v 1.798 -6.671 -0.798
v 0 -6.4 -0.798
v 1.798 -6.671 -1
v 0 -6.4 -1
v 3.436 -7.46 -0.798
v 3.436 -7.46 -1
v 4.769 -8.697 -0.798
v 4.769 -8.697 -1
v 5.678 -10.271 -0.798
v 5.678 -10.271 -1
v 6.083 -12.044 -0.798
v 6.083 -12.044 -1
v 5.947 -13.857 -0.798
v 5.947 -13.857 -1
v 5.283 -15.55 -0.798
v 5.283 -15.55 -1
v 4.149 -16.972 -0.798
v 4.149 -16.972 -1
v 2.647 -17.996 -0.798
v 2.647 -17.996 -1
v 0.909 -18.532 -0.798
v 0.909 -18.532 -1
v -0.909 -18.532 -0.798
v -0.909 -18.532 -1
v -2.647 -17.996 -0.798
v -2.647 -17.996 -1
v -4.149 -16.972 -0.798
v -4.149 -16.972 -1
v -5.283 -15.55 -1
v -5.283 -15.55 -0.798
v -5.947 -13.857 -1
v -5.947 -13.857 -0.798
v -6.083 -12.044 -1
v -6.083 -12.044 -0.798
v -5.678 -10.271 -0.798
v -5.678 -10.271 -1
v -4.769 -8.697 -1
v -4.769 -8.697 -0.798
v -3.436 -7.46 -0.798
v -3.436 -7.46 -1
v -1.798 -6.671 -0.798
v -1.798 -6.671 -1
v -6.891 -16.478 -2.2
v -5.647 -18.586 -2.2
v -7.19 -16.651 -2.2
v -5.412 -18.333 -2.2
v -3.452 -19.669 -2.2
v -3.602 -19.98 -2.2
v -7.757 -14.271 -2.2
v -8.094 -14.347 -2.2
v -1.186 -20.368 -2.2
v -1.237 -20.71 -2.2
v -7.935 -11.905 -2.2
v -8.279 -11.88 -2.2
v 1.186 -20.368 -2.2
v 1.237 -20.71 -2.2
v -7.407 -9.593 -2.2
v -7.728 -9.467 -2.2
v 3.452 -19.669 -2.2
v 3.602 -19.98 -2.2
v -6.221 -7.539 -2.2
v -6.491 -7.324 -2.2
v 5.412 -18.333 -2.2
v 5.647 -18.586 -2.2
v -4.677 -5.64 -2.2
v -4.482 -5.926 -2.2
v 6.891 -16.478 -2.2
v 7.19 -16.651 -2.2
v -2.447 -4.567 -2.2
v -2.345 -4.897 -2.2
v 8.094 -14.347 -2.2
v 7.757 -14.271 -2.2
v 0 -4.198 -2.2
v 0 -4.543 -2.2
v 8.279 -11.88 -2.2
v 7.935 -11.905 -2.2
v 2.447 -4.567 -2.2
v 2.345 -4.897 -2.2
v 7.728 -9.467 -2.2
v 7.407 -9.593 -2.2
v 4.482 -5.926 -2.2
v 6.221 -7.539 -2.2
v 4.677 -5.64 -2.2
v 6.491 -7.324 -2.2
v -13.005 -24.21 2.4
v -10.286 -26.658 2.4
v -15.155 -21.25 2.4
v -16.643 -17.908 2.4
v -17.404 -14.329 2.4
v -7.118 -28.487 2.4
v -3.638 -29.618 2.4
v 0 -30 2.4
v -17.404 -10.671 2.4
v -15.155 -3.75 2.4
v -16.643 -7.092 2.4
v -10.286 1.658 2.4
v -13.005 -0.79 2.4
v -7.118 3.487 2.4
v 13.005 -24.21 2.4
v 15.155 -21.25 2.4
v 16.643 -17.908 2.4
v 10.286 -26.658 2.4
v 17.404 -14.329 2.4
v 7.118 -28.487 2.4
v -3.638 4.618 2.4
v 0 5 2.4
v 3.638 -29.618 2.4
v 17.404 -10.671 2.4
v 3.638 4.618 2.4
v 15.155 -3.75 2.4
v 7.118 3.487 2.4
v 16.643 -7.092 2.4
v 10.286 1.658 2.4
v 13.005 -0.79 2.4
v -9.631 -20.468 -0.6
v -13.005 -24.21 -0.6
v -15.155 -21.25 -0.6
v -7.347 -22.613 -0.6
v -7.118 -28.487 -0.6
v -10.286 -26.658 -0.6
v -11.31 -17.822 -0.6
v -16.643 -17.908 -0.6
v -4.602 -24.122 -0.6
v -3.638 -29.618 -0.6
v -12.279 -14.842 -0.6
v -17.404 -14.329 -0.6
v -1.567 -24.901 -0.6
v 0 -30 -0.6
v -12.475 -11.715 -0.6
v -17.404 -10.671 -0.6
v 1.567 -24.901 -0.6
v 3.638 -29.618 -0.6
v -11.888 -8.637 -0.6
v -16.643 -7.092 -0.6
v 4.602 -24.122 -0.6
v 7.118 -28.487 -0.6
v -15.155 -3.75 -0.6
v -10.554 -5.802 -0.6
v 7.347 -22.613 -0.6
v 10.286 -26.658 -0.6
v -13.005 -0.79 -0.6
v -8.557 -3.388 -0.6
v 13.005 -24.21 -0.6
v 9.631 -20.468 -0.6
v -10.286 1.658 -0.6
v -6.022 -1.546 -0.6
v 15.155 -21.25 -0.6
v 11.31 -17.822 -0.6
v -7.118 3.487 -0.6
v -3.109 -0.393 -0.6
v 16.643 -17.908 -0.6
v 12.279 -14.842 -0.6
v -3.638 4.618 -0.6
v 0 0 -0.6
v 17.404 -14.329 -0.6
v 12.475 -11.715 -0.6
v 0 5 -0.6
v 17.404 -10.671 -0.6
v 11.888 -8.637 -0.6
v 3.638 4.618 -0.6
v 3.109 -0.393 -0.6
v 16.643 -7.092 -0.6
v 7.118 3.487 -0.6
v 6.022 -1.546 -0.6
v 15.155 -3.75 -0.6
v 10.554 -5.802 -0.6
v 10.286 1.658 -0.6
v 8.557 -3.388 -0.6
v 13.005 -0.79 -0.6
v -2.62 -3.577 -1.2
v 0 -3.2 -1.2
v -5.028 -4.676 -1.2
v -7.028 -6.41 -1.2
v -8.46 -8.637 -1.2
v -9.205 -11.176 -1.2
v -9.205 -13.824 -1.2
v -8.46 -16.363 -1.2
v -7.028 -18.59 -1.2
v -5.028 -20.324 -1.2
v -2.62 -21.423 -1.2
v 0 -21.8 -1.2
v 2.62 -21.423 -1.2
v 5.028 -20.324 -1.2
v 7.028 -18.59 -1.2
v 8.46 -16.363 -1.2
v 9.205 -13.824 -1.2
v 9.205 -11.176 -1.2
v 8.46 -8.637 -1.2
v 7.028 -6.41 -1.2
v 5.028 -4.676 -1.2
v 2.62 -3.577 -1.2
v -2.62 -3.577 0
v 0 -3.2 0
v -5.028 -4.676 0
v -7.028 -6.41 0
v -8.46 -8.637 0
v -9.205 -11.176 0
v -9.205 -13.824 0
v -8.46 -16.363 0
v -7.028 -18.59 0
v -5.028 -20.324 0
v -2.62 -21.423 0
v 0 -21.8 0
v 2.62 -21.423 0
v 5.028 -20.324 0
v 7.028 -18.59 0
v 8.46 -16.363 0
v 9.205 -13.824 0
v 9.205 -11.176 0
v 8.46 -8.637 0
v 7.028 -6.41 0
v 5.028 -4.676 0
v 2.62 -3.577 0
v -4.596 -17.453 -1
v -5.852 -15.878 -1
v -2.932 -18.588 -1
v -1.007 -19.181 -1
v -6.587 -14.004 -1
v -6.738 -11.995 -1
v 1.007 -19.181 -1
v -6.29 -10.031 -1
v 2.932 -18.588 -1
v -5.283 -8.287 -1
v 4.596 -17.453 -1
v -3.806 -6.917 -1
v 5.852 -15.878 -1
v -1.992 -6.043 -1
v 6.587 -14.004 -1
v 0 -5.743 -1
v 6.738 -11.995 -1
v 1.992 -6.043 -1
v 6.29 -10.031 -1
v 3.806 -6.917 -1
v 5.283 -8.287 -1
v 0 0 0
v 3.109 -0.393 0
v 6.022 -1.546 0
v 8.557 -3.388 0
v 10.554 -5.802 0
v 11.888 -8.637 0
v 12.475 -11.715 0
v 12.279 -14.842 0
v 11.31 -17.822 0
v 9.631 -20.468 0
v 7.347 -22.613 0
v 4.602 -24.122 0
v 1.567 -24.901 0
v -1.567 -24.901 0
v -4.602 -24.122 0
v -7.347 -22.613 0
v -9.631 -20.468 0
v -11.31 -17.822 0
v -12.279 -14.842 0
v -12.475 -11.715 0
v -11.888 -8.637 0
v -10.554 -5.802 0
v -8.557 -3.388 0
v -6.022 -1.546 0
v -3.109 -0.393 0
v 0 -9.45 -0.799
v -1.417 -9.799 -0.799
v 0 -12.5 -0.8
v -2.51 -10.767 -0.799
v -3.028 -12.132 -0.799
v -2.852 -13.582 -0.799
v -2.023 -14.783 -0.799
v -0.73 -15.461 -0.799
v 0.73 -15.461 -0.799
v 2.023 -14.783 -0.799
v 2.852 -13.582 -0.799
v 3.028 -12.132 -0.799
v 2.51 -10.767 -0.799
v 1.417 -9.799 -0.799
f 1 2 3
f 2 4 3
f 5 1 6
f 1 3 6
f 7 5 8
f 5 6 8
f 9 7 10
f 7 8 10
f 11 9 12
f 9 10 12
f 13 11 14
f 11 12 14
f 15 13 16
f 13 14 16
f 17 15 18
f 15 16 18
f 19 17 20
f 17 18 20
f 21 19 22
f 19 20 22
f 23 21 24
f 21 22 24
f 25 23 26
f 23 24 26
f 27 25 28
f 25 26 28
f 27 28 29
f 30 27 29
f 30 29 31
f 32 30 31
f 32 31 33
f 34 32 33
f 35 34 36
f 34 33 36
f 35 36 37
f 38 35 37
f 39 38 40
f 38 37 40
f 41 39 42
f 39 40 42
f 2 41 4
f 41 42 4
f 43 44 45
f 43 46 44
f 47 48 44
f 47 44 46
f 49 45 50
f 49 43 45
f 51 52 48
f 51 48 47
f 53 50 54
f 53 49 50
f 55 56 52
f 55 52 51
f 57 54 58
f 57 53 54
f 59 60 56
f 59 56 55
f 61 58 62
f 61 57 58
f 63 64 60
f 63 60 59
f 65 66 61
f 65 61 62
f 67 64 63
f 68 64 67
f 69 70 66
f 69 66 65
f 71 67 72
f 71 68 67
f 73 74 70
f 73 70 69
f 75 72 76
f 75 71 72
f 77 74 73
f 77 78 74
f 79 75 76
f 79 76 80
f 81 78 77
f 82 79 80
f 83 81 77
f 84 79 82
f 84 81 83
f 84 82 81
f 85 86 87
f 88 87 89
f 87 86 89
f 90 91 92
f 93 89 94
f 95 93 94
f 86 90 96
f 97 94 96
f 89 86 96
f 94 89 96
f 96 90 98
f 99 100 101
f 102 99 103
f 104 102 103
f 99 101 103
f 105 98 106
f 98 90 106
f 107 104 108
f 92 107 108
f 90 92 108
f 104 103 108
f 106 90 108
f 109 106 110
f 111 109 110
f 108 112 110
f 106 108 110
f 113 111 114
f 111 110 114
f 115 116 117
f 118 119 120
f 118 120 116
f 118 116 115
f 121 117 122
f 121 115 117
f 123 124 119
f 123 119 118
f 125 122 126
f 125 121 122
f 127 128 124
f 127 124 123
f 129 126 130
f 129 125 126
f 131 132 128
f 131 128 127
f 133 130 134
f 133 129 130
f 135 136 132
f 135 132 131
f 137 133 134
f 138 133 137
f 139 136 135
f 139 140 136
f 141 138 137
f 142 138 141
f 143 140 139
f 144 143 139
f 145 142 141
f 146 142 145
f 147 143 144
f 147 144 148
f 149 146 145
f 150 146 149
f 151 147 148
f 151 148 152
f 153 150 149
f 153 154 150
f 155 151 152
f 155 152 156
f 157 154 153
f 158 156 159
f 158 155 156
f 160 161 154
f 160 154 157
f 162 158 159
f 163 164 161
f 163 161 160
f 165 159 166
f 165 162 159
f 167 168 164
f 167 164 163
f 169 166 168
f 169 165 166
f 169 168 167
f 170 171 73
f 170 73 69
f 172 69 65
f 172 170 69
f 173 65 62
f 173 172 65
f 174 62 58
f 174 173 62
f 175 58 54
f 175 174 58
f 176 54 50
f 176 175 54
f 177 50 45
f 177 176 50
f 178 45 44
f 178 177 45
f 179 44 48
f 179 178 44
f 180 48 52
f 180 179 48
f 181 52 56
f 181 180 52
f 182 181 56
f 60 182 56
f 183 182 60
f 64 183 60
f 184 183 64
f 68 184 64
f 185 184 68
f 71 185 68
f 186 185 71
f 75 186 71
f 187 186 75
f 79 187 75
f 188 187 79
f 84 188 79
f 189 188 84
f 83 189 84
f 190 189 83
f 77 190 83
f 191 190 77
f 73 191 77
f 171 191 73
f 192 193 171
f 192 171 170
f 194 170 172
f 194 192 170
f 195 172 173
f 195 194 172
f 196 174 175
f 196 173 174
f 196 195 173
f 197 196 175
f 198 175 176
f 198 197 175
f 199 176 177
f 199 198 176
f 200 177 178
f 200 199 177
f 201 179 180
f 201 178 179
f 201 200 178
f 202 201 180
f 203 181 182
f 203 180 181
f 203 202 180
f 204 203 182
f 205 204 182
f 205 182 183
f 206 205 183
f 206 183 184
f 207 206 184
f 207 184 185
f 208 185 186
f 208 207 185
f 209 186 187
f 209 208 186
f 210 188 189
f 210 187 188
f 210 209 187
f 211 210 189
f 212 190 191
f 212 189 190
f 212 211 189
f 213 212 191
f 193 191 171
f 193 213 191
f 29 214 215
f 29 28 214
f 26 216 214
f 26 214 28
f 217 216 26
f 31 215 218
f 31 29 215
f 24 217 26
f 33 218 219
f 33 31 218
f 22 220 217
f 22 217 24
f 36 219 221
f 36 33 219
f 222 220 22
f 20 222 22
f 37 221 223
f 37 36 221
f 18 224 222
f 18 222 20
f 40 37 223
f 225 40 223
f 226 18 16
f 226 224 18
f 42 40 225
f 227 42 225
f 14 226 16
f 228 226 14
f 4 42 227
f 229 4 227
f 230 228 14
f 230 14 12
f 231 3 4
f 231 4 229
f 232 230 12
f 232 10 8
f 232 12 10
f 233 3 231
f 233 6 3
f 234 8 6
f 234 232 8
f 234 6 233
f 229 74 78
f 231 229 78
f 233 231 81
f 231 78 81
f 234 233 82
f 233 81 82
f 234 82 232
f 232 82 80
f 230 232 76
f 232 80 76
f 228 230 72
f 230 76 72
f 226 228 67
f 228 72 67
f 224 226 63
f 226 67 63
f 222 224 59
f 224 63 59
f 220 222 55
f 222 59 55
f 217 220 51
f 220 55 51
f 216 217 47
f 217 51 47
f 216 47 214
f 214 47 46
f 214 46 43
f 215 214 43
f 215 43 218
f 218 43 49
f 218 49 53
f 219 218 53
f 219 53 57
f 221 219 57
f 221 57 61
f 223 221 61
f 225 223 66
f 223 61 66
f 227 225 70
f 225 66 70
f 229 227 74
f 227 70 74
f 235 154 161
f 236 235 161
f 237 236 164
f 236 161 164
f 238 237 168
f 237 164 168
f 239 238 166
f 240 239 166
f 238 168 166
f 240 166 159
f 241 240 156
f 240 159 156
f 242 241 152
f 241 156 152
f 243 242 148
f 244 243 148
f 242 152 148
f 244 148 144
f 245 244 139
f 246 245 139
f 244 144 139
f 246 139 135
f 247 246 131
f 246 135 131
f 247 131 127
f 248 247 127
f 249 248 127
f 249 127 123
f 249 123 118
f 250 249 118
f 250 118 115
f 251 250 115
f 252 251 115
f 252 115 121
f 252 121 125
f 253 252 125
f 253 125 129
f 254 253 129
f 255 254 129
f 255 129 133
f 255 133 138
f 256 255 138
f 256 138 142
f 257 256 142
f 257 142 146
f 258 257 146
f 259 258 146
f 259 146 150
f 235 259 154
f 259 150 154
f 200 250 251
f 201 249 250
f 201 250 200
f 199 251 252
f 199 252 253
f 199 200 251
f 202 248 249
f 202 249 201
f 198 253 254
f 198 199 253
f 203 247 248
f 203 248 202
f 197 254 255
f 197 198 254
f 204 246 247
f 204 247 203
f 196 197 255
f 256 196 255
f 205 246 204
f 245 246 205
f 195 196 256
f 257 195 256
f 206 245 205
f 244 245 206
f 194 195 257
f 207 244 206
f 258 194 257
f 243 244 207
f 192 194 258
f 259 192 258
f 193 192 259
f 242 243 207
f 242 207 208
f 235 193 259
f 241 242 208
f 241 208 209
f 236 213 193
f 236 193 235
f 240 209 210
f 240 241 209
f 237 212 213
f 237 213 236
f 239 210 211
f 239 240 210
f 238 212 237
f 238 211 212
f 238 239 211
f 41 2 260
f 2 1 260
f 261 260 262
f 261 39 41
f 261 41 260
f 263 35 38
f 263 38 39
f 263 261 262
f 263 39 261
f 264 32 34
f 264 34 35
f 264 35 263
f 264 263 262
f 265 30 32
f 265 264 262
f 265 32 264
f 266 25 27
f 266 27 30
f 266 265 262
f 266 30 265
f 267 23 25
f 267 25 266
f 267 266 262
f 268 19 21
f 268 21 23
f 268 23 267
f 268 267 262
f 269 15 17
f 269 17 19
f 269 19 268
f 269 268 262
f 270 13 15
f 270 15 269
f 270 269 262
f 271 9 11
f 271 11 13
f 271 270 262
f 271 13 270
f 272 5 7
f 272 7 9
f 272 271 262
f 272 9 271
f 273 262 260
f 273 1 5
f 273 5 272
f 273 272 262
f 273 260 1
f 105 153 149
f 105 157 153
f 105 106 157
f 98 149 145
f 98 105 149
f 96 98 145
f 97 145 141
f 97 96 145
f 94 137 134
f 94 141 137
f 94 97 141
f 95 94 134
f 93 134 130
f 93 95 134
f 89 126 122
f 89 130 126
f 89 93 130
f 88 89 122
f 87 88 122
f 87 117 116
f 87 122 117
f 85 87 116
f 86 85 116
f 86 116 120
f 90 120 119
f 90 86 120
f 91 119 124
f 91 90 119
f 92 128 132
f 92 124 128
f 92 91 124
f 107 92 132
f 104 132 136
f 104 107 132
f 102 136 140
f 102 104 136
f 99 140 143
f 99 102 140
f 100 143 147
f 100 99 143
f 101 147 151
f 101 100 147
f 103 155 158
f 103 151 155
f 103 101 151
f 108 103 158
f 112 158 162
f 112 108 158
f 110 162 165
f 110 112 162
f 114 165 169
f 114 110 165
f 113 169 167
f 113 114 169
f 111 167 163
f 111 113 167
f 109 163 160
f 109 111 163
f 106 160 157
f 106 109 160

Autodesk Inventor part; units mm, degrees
ref_plane "YZ Plane" through (0, 0, 0) normal (1, 0, 0) x (0, 1, 0)
ref_plane "XZ Plane" through (0, 0, 0) normal (0, 1, 0) x (-1, 0, 0)
ref_plane "XY Plane" through (0, 0, 0) normal (0, 0, 1) x (1, 0, 0)
sketch "Skizze1" plane through (0, 0, 0) normal (1, 0, 0) x (0, 1, 0)
  line L0 (0, 0) -> (0, -0.6)
  line L1 (-25, 0) -> (0, 0) projected
  line L2 (-25, -0.6) -> (0, -0.6) projected
  line L3 (-20.8023, -2.2) -> (-4.1977, -2.2) projected
  line L4 (-20.6011, -1.9989) -> (-21.4, -1.2)
  line L5 (-21.4, -1.2) -> (-21.4, 0)
  line L6 (-25, 0) -> (-25, -0.6)
  line L7 (-22.8485, -0.6) -> (-20.8497, -2.5989)
  line L8 (-21.0508, -2.8) -> (-3.9492, -2.8) projected
  line L9 (0, -0.6) -> (5, -0.6)
  line L10 (5, -0.6) -> (5, 2.4)
  line L11 (-12.5, -6.6891) -> (-12.5, -2.8)
  line L12 (0, 4.2178) -> (0, -8.5069) projected
  line L13 (5, 2.4) -> (-12.5, 2.4)
  line L14 (-19.2569, -1) -> (-5.7431, -1) projected
  line L15 (-18.5, -0.8) -> (-6.5, -0.8) construction
  line L16 (-6.5, -0.8) -> (-6.5, -1) construction
  line L17 (-6.5, -1) -> (-18.5, -1) construction
  line L18 (-18.5, -1) -> (-18.5, -0.8) construction
  line L19 (-18.5, -0.8) -> (-12.5, -0.9) construction
  line L20 (-6.5, -0.8) -> (-18.5, -1) construction
  line L21 (-12.5, 2.4) -> (-12.5, -0.8)
  line L22 (-12.5, -0.8) -> (-6.4, -0.7983) construction
  line L23 (-6.4, -0.7983) -> (-6.4, -1) construction
  line L24 (-12.5, -0.8) -> (-6.4, -0.7983) construction
  line L25 (-6.4, -0.7983) -> (-6.4, -1) construction
  line L26 (-12.5, -0.8) -> (-6.4, -0.7983)
  line L27 (-6.4, -0.7983) -> (-6.4, -1)
  line L28 (-6.5, -1) -> (-6.5167, -1)
  line L29 (-5.7431, -1) -> (-6.1949, -1.0051)
  line L30 (-3.6, 0) -> (0, 0)
  line L31 (-5.9715, -1.2285) -> (-6.1949, -1.0051)
  line L32 (-5, -2.2) -> (-4.4683, -2.2)
  line L33 (-5, -2.2) -> (-5.3167, -2.2)
  line L34 (-5.3167, -2.2) -> (-3.6196, -2.2) construction
  line L35 (-3.2, -1.2) -> (-3.2, 0)
  line L36 (-4.1989, -2.1989) -> (-3.2, -1.2)
  line L37 (-20.8023, -2.2) -> (-4.1977, -2.2) projected
  line L38 (-4.1977, -2.2) -> (-4.9977, -2.2)
  line L39 (-5.7431, -1) -> (-4.5431, -2.2)
  point P0 (-2.1515, -0.6)
  point P1 (-22.8485, -0.6)
  point P2 (-12.5, -1)
  point P3 (-12.5, -0.6)
  point P4 (-21.4, -0.6)
  point P5 (-12.5, 0)
  dimension "d0" = 5
  dimension "d1" = 3
  dimension "d2" = 17.1016
  dimension "d3" = 8.5508
  dimension "d4" = 12
  dimension "d5" = 0.2
  dimension "d6" = 6.1
revolve "Umdrehung1" add sketch "Skizze1" angle 360 about axis through (0, -12.5, 2.4) along (0, 0, -1) contours L12 L13 L10 L9 L0 | L1 L21 L13 L12 | L35 L2 L21 L1 | L35 L36 L3 L39 L14 L27 L26 L21 L2
equation "\"d3\" = 0.5 * d2"
properties part number "50_ETL_Membrane_Mould_Lower_v0"
